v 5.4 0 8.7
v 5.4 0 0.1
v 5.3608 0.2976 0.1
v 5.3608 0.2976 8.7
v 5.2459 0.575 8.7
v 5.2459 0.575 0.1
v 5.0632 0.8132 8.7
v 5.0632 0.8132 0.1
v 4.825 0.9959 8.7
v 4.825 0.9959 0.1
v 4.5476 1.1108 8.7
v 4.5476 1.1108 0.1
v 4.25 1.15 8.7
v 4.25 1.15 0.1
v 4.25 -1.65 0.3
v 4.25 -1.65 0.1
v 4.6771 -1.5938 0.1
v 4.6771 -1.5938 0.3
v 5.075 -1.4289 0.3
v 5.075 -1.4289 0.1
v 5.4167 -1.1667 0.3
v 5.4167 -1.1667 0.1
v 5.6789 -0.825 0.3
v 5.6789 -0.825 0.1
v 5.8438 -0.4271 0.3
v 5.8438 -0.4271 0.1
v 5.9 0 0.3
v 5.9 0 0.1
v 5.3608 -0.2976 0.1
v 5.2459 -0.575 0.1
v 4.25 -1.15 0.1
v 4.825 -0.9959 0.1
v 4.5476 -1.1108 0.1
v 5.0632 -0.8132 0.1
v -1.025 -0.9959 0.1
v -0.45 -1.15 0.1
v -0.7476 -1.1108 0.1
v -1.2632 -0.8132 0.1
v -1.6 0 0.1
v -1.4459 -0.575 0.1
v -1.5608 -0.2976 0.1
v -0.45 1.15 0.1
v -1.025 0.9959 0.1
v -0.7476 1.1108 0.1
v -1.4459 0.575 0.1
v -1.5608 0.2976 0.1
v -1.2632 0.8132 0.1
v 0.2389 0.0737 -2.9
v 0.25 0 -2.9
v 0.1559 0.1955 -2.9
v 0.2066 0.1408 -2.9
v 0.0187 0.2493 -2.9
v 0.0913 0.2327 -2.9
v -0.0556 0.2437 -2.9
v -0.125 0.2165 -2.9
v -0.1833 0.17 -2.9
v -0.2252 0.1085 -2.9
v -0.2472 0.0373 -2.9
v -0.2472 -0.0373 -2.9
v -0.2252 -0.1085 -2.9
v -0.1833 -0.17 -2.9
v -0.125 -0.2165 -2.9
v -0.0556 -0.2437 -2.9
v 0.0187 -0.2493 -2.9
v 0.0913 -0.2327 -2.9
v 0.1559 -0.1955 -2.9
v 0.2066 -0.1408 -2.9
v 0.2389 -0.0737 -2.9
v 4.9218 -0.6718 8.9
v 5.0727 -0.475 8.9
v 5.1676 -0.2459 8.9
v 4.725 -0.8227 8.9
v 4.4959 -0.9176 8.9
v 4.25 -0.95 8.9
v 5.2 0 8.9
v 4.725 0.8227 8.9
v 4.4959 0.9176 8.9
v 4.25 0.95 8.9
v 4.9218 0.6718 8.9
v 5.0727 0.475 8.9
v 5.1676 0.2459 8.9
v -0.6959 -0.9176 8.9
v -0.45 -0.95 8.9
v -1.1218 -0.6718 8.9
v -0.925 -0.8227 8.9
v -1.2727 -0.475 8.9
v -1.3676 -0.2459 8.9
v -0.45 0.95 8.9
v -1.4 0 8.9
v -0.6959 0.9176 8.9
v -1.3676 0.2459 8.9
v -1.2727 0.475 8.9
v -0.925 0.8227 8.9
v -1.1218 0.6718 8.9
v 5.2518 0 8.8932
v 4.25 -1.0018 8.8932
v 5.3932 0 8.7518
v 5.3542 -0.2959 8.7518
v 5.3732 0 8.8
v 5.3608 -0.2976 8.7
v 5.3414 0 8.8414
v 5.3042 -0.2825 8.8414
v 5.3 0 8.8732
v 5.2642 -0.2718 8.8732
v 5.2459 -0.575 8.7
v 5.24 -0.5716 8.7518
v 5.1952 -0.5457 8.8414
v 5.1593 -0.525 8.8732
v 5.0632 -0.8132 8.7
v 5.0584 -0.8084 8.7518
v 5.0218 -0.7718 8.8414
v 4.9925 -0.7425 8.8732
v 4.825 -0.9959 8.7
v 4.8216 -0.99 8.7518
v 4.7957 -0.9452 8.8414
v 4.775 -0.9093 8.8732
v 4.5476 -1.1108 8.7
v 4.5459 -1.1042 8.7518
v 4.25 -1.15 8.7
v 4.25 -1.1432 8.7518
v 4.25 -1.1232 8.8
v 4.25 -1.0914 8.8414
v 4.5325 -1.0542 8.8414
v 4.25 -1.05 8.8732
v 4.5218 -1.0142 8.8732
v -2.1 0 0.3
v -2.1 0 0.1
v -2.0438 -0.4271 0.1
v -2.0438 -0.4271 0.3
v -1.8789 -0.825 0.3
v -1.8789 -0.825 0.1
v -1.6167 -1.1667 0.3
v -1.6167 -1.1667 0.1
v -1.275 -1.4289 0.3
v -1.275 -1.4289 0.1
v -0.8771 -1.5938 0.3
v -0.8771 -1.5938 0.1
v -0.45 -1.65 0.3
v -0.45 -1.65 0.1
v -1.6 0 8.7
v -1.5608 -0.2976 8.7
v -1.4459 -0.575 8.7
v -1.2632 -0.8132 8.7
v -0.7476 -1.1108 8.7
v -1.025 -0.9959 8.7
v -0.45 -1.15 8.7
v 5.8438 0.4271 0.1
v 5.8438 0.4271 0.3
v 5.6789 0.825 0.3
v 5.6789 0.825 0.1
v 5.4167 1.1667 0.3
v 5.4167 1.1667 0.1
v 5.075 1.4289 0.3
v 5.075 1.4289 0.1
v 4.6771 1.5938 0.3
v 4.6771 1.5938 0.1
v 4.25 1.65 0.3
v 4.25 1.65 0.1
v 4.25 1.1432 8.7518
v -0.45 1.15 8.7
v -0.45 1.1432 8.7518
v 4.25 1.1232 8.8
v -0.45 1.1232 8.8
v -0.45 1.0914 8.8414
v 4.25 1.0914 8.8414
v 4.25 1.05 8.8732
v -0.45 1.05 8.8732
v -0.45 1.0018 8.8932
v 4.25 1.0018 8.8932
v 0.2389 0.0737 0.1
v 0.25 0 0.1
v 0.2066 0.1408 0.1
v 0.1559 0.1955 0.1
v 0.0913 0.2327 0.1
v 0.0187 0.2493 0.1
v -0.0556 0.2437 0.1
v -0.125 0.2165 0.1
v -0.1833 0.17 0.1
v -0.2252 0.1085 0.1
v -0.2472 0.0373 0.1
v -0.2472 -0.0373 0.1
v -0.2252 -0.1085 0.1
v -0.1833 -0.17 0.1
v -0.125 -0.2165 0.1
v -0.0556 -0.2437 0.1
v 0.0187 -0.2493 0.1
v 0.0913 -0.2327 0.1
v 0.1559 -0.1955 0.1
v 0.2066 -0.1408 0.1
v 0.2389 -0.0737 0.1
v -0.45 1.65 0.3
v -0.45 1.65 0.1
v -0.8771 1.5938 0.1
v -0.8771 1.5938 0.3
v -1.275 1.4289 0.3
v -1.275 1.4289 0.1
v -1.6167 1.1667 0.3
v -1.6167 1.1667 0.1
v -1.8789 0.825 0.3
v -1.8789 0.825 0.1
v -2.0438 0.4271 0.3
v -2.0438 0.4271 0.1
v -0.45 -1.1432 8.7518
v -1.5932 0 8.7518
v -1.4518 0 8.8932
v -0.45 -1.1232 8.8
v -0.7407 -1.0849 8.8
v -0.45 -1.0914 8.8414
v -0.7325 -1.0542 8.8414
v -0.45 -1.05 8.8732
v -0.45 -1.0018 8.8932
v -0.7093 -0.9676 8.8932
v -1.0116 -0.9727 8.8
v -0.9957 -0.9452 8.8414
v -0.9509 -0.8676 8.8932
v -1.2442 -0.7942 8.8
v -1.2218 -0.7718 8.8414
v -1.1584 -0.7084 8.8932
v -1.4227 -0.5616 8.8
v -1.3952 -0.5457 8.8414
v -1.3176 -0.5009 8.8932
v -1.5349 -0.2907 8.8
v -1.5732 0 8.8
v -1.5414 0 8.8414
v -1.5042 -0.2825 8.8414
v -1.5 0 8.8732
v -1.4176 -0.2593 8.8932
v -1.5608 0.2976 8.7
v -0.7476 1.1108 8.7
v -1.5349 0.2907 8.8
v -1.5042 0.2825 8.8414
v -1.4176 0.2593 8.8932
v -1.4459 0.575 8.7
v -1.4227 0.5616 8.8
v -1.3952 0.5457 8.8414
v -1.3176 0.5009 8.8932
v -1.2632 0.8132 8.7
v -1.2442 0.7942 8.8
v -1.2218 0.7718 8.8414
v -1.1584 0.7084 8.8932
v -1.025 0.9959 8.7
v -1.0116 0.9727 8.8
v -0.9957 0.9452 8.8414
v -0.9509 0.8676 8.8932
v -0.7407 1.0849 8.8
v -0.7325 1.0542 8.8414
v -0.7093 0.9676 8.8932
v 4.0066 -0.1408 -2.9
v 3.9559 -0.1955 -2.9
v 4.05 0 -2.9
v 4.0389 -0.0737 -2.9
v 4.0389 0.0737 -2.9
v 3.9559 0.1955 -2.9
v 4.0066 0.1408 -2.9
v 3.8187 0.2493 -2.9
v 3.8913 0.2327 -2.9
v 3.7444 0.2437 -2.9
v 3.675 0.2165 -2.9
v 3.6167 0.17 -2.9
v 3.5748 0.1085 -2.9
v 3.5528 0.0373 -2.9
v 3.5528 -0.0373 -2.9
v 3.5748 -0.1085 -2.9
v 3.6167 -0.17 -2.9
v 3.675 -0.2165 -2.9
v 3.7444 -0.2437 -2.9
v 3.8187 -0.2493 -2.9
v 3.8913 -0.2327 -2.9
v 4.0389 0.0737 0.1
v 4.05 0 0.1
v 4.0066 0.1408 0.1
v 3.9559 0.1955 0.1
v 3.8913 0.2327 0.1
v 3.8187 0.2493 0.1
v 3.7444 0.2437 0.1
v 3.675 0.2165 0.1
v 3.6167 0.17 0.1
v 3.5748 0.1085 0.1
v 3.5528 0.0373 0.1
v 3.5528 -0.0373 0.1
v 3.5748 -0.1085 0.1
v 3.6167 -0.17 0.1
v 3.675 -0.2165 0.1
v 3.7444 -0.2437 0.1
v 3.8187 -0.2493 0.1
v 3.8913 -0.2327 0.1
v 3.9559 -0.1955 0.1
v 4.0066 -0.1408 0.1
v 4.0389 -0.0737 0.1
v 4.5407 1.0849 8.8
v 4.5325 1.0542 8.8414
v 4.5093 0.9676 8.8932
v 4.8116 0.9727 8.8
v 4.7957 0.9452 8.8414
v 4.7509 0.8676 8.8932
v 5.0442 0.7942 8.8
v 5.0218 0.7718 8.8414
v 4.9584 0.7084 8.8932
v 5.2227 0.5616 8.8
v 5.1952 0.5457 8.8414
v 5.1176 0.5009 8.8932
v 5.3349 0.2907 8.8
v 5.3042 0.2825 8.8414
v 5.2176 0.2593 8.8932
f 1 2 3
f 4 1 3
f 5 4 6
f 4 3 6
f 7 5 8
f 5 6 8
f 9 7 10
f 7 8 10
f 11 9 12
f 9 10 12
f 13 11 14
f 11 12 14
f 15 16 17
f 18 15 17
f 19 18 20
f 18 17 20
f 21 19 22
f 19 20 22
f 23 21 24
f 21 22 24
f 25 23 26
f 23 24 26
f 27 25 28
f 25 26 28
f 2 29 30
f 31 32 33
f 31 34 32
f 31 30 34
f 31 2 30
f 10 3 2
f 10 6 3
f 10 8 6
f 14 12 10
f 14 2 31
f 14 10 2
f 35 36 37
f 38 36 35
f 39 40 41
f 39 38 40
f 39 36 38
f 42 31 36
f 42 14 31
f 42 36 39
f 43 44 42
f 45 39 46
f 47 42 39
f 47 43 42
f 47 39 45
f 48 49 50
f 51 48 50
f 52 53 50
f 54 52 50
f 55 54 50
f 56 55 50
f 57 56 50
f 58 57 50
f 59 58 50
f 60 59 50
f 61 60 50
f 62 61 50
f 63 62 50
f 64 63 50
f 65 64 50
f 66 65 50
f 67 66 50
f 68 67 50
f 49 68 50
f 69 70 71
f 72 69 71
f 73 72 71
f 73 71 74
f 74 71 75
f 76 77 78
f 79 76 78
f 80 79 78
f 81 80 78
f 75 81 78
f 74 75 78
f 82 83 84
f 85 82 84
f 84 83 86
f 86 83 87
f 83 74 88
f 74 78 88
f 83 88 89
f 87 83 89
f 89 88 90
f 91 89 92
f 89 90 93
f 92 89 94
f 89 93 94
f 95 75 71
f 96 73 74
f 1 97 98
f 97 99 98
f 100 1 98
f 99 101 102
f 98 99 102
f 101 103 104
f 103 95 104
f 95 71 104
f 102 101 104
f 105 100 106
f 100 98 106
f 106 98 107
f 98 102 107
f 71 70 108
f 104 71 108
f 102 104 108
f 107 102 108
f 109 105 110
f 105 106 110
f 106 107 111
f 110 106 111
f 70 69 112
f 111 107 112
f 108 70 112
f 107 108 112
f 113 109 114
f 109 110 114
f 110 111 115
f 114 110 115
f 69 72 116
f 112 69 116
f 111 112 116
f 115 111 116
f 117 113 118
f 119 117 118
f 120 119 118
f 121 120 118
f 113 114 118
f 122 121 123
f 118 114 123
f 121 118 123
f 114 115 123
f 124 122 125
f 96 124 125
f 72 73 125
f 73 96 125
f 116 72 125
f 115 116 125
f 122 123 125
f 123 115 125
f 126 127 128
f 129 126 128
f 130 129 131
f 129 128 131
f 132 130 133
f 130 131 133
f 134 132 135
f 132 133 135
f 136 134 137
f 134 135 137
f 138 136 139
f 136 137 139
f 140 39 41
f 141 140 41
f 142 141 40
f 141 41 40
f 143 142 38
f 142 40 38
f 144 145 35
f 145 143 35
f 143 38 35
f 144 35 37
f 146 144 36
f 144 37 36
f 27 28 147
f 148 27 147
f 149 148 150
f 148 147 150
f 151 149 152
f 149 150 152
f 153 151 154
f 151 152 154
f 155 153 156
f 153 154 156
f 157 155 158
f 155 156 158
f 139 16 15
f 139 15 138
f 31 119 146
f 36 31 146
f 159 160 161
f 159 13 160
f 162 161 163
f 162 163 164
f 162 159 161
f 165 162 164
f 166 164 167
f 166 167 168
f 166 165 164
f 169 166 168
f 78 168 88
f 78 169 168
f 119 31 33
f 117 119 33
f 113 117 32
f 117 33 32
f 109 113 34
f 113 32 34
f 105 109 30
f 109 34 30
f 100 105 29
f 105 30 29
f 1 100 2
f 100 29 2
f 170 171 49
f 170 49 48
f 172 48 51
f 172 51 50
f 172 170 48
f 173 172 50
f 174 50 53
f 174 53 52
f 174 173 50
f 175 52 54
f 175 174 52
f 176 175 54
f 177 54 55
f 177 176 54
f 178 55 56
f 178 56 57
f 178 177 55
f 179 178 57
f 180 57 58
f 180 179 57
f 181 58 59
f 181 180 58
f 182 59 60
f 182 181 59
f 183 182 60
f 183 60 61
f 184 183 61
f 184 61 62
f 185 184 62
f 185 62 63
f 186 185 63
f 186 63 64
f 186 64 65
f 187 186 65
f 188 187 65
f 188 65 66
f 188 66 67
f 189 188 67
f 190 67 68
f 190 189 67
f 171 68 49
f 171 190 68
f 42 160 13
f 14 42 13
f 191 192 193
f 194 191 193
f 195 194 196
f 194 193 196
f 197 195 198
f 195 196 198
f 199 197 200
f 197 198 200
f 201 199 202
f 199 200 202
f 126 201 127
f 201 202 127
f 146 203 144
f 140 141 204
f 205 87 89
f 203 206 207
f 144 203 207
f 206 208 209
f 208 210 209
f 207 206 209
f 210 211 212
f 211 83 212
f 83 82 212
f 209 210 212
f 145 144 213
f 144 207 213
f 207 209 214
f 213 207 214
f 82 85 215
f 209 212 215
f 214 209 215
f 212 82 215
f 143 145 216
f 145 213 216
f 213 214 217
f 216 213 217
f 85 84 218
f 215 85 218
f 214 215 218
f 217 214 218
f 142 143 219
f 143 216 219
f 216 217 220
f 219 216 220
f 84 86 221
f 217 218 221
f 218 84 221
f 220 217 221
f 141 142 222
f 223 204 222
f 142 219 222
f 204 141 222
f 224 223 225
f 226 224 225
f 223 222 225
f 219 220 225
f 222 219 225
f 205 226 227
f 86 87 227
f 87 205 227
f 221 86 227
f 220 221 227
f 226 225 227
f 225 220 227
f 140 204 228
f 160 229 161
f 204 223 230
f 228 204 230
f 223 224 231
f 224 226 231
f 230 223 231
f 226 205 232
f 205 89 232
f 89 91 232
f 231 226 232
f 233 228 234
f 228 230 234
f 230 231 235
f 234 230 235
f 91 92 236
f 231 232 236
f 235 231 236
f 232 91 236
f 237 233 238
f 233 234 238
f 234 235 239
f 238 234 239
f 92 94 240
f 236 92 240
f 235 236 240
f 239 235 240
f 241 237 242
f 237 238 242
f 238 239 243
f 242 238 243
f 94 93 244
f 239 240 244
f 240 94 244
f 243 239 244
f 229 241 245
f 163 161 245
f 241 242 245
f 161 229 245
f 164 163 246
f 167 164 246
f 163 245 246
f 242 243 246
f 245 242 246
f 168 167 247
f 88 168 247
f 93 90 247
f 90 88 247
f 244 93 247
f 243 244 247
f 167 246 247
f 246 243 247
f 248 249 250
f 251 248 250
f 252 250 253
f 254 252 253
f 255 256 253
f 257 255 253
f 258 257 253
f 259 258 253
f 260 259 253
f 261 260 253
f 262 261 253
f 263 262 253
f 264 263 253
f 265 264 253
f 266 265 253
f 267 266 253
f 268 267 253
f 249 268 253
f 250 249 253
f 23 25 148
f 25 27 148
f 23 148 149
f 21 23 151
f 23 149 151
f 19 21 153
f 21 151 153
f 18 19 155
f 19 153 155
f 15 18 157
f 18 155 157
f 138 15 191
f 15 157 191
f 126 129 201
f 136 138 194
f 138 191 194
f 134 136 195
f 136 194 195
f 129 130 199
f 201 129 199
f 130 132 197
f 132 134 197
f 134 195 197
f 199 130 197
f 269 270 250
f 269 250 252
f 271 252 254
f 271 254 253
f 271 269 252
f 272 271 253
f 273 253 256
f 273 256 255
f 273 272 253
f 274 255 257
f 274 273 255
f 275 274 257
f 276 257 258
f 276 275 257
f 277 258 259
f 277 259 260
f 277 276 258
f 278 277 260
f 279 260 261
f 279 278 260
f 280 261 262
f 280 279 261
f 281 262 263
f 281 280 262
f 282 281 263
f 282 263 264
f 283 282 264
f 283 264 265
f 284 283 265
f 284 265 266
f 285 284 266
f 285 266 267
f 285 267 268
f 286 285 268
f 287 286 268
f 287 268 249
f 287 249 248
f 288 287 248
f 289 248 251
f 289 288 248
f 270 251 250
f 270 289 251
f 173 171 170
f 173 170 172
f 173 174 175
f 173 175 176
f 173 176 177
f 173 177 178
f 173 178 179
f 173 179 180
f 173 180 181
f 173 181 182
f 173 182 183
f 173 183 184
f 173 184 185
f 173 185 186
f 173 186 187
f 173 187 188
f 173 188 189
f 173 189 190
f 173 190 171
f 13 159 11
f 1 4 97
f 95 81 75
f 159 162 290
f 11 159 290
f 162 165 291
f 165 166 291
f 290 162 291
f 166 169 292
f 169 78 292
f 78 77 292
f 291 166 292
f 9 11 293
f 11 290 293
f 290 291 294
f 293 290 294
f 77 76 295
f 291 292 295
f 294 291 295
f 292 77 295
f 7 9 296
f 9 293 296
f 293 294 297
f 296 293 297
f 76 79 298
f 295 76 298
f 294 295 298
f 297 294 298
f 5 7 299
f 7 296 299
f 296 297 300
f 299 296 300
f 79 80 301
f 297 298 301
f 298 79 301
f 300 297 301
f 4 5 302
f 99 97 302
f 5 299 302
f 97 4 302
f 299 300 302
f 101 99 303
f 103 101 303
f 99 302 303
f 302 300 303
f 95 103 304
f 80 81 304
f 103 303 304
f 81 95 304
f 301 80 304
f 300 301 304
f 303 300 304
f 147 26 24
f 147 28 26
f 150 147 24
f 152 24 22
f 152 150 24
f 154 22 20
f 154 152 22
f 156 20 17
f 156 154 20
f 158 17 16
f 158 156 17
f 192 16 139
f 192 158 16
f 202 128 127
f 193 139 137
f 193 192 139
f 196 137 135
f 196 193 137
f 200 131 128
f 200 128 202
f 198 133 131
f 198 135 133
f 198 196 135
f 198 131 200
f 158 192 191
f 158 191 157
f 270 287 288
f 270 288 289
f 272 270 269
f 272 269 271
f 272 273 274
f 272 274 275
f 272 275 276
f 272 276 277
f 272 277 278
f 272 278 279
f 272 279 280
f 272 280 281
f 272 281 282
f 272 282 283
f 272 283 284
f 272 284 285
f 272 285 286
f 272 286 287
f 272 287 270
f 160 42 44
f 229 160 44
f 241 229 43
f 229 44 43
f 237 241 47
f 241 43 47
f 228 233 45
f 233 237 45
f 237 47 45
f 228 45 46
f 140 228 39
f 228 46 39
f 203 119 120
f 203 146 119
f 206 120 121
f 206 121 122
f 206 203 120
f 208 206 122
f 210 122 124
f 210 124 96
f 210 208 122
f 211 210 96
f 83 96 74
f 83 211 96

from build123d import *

# Parameters (mm, degrees)
SKETCH_R     = 0.25
PAD_DEPTH    = 3
PAD001_DEPTH = 0.2
PAD002_DEPTH = 8.8
FILLET_R     = 0.2


with BuildPart() as pad:
    # Sketch → Pad (new body)
    with BuildSketch(Plane.XY.offset(0.1)):
        Circle(SKETCH_R)
        with Locations((3.8, 0)):
            Circle(SKETCH_R)
    extrude(amount=-PAD_DEPTH)


with BuildPart() as pad001:
    # Sketch001 → Pad001 (new body)
    with BuildSketch(Plane.XY.offset(0.1)):
        with BuildLine():
            Line((-0.45, 1.65), (4.25, 1.65))
            ThreePointArc((5.9, 0), (5.416726, 1.166726), (4.25, 1.65))
            ThreePointArc((4.25, -1.65), (5.416726, -1.166726), (5.9, 0))
            Line((4.25, -1.65), (-0.45, -1.65))
            ThreePointArc((-2.1, 0), (-1.616726, -1.166726), (-0.45, -1.65))
            ThreePointArc((-0.45, 1.65), (-1.616726, 1.166726), (-2.1, 0))
        make_face()
    extrude(amount=PAD001_DEPTH)


with BuildPart() as fillet_body:
    # Sketch003 → Pad002 (new body)
    with BuildSketch(Plane.XY.offset(0.1)):
        with BuildLine():
            Line((-0.45, 1.15), (4.25, 1.15))
            ThreePointArc((5.4, 0), (5.063173, 0.813173), (4.25, 1.15))
            ThreePointArc((4.25, -1.15), (5.063173, -0.813173), (5.4, 0))
            Line((4.25, -1.15), (-0.45, -1.15))
            ThreePointArc((-1.6, 0), (-1.263173, -0.813173), (-0.45, -1.15))
            ThreePointArc((-0.45, 1.15), (-1.263173, 0.813173), (-1.6, 0))
        make_face()
    extrude(amount=PAD002_DEPTH)

    # Fillet
    fillet_edges = [fillet_body.edges().sort_by_distance(p)[0] for p in [
        (1.9, 1.15, 8.9),
        (-1.263173, 0.813173, 8.9),
        (-1.263173, -0.813173, 8.9),
        (1.9, -1.15, 8.9),
        (5.063173, -0.813173, 8.9),
        (5.063173, 0.813173, 8.9),
    ]]
    fillet(fillet_edges, radius=FILLET_R)


solid = Compound([pad.part, pad001.part, fillet_body.part])
